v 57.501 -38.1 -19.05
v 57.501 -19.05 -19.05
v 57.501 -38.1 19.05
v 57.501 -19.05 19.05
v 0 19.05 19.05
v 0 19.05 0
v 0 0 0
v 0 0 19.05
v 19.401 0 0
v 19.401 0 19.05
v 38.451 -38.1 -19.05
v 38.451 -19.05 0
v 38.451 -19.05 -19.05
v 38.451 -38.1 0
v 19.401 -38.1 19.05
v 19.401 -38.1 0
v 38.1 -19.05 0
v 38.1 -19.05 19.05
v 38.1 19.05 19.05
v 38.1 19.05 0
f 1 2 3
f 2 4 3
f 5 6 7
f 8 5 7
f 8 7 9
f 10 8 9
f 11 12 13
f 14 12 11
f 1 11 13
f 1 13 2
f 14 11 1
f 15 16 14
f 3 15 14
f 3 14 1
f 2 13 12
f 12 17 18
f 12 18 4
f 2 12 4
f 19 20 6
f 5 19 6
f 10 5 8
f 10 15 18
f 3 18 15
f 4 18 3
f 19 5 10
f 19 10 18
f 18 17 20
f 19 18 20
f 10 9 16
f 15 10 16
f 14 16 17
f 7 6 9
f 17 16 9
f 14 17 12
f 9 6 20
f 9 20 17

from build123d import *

# Parameters (mm, degrees)
F1_DEPTH = 19.05
F2_W     = 19.05
F2_H     = 19.05
F3_DEPTH = 19.05


with BuildPart() as f1:
    # F0 (on Top) → F1 (new body)
    with BuildSketch(Plane.XY):
        Polygon((0, 19.05), (0, 0), (19.400613, 0), (19.400613, -38.1), (57.500613, -38.1), (57.500613, -19.05), (38.1, -19.05), (38.1, 19.05), align=None)
    extrude(amount=F1_DEPTH)

    # F2 (on face) → F3 (join)
    with BuildSketch(Plane(origin=(0, 0, 0), x_dir=(1, 0, 0), z_dir=(0, 0, -1))):
        with Locations((47.975613, 28.575)):
            Rectangle(F2_W, F2_H)
    extrude(amount=F3_DEPTH)


solid = f1.part
